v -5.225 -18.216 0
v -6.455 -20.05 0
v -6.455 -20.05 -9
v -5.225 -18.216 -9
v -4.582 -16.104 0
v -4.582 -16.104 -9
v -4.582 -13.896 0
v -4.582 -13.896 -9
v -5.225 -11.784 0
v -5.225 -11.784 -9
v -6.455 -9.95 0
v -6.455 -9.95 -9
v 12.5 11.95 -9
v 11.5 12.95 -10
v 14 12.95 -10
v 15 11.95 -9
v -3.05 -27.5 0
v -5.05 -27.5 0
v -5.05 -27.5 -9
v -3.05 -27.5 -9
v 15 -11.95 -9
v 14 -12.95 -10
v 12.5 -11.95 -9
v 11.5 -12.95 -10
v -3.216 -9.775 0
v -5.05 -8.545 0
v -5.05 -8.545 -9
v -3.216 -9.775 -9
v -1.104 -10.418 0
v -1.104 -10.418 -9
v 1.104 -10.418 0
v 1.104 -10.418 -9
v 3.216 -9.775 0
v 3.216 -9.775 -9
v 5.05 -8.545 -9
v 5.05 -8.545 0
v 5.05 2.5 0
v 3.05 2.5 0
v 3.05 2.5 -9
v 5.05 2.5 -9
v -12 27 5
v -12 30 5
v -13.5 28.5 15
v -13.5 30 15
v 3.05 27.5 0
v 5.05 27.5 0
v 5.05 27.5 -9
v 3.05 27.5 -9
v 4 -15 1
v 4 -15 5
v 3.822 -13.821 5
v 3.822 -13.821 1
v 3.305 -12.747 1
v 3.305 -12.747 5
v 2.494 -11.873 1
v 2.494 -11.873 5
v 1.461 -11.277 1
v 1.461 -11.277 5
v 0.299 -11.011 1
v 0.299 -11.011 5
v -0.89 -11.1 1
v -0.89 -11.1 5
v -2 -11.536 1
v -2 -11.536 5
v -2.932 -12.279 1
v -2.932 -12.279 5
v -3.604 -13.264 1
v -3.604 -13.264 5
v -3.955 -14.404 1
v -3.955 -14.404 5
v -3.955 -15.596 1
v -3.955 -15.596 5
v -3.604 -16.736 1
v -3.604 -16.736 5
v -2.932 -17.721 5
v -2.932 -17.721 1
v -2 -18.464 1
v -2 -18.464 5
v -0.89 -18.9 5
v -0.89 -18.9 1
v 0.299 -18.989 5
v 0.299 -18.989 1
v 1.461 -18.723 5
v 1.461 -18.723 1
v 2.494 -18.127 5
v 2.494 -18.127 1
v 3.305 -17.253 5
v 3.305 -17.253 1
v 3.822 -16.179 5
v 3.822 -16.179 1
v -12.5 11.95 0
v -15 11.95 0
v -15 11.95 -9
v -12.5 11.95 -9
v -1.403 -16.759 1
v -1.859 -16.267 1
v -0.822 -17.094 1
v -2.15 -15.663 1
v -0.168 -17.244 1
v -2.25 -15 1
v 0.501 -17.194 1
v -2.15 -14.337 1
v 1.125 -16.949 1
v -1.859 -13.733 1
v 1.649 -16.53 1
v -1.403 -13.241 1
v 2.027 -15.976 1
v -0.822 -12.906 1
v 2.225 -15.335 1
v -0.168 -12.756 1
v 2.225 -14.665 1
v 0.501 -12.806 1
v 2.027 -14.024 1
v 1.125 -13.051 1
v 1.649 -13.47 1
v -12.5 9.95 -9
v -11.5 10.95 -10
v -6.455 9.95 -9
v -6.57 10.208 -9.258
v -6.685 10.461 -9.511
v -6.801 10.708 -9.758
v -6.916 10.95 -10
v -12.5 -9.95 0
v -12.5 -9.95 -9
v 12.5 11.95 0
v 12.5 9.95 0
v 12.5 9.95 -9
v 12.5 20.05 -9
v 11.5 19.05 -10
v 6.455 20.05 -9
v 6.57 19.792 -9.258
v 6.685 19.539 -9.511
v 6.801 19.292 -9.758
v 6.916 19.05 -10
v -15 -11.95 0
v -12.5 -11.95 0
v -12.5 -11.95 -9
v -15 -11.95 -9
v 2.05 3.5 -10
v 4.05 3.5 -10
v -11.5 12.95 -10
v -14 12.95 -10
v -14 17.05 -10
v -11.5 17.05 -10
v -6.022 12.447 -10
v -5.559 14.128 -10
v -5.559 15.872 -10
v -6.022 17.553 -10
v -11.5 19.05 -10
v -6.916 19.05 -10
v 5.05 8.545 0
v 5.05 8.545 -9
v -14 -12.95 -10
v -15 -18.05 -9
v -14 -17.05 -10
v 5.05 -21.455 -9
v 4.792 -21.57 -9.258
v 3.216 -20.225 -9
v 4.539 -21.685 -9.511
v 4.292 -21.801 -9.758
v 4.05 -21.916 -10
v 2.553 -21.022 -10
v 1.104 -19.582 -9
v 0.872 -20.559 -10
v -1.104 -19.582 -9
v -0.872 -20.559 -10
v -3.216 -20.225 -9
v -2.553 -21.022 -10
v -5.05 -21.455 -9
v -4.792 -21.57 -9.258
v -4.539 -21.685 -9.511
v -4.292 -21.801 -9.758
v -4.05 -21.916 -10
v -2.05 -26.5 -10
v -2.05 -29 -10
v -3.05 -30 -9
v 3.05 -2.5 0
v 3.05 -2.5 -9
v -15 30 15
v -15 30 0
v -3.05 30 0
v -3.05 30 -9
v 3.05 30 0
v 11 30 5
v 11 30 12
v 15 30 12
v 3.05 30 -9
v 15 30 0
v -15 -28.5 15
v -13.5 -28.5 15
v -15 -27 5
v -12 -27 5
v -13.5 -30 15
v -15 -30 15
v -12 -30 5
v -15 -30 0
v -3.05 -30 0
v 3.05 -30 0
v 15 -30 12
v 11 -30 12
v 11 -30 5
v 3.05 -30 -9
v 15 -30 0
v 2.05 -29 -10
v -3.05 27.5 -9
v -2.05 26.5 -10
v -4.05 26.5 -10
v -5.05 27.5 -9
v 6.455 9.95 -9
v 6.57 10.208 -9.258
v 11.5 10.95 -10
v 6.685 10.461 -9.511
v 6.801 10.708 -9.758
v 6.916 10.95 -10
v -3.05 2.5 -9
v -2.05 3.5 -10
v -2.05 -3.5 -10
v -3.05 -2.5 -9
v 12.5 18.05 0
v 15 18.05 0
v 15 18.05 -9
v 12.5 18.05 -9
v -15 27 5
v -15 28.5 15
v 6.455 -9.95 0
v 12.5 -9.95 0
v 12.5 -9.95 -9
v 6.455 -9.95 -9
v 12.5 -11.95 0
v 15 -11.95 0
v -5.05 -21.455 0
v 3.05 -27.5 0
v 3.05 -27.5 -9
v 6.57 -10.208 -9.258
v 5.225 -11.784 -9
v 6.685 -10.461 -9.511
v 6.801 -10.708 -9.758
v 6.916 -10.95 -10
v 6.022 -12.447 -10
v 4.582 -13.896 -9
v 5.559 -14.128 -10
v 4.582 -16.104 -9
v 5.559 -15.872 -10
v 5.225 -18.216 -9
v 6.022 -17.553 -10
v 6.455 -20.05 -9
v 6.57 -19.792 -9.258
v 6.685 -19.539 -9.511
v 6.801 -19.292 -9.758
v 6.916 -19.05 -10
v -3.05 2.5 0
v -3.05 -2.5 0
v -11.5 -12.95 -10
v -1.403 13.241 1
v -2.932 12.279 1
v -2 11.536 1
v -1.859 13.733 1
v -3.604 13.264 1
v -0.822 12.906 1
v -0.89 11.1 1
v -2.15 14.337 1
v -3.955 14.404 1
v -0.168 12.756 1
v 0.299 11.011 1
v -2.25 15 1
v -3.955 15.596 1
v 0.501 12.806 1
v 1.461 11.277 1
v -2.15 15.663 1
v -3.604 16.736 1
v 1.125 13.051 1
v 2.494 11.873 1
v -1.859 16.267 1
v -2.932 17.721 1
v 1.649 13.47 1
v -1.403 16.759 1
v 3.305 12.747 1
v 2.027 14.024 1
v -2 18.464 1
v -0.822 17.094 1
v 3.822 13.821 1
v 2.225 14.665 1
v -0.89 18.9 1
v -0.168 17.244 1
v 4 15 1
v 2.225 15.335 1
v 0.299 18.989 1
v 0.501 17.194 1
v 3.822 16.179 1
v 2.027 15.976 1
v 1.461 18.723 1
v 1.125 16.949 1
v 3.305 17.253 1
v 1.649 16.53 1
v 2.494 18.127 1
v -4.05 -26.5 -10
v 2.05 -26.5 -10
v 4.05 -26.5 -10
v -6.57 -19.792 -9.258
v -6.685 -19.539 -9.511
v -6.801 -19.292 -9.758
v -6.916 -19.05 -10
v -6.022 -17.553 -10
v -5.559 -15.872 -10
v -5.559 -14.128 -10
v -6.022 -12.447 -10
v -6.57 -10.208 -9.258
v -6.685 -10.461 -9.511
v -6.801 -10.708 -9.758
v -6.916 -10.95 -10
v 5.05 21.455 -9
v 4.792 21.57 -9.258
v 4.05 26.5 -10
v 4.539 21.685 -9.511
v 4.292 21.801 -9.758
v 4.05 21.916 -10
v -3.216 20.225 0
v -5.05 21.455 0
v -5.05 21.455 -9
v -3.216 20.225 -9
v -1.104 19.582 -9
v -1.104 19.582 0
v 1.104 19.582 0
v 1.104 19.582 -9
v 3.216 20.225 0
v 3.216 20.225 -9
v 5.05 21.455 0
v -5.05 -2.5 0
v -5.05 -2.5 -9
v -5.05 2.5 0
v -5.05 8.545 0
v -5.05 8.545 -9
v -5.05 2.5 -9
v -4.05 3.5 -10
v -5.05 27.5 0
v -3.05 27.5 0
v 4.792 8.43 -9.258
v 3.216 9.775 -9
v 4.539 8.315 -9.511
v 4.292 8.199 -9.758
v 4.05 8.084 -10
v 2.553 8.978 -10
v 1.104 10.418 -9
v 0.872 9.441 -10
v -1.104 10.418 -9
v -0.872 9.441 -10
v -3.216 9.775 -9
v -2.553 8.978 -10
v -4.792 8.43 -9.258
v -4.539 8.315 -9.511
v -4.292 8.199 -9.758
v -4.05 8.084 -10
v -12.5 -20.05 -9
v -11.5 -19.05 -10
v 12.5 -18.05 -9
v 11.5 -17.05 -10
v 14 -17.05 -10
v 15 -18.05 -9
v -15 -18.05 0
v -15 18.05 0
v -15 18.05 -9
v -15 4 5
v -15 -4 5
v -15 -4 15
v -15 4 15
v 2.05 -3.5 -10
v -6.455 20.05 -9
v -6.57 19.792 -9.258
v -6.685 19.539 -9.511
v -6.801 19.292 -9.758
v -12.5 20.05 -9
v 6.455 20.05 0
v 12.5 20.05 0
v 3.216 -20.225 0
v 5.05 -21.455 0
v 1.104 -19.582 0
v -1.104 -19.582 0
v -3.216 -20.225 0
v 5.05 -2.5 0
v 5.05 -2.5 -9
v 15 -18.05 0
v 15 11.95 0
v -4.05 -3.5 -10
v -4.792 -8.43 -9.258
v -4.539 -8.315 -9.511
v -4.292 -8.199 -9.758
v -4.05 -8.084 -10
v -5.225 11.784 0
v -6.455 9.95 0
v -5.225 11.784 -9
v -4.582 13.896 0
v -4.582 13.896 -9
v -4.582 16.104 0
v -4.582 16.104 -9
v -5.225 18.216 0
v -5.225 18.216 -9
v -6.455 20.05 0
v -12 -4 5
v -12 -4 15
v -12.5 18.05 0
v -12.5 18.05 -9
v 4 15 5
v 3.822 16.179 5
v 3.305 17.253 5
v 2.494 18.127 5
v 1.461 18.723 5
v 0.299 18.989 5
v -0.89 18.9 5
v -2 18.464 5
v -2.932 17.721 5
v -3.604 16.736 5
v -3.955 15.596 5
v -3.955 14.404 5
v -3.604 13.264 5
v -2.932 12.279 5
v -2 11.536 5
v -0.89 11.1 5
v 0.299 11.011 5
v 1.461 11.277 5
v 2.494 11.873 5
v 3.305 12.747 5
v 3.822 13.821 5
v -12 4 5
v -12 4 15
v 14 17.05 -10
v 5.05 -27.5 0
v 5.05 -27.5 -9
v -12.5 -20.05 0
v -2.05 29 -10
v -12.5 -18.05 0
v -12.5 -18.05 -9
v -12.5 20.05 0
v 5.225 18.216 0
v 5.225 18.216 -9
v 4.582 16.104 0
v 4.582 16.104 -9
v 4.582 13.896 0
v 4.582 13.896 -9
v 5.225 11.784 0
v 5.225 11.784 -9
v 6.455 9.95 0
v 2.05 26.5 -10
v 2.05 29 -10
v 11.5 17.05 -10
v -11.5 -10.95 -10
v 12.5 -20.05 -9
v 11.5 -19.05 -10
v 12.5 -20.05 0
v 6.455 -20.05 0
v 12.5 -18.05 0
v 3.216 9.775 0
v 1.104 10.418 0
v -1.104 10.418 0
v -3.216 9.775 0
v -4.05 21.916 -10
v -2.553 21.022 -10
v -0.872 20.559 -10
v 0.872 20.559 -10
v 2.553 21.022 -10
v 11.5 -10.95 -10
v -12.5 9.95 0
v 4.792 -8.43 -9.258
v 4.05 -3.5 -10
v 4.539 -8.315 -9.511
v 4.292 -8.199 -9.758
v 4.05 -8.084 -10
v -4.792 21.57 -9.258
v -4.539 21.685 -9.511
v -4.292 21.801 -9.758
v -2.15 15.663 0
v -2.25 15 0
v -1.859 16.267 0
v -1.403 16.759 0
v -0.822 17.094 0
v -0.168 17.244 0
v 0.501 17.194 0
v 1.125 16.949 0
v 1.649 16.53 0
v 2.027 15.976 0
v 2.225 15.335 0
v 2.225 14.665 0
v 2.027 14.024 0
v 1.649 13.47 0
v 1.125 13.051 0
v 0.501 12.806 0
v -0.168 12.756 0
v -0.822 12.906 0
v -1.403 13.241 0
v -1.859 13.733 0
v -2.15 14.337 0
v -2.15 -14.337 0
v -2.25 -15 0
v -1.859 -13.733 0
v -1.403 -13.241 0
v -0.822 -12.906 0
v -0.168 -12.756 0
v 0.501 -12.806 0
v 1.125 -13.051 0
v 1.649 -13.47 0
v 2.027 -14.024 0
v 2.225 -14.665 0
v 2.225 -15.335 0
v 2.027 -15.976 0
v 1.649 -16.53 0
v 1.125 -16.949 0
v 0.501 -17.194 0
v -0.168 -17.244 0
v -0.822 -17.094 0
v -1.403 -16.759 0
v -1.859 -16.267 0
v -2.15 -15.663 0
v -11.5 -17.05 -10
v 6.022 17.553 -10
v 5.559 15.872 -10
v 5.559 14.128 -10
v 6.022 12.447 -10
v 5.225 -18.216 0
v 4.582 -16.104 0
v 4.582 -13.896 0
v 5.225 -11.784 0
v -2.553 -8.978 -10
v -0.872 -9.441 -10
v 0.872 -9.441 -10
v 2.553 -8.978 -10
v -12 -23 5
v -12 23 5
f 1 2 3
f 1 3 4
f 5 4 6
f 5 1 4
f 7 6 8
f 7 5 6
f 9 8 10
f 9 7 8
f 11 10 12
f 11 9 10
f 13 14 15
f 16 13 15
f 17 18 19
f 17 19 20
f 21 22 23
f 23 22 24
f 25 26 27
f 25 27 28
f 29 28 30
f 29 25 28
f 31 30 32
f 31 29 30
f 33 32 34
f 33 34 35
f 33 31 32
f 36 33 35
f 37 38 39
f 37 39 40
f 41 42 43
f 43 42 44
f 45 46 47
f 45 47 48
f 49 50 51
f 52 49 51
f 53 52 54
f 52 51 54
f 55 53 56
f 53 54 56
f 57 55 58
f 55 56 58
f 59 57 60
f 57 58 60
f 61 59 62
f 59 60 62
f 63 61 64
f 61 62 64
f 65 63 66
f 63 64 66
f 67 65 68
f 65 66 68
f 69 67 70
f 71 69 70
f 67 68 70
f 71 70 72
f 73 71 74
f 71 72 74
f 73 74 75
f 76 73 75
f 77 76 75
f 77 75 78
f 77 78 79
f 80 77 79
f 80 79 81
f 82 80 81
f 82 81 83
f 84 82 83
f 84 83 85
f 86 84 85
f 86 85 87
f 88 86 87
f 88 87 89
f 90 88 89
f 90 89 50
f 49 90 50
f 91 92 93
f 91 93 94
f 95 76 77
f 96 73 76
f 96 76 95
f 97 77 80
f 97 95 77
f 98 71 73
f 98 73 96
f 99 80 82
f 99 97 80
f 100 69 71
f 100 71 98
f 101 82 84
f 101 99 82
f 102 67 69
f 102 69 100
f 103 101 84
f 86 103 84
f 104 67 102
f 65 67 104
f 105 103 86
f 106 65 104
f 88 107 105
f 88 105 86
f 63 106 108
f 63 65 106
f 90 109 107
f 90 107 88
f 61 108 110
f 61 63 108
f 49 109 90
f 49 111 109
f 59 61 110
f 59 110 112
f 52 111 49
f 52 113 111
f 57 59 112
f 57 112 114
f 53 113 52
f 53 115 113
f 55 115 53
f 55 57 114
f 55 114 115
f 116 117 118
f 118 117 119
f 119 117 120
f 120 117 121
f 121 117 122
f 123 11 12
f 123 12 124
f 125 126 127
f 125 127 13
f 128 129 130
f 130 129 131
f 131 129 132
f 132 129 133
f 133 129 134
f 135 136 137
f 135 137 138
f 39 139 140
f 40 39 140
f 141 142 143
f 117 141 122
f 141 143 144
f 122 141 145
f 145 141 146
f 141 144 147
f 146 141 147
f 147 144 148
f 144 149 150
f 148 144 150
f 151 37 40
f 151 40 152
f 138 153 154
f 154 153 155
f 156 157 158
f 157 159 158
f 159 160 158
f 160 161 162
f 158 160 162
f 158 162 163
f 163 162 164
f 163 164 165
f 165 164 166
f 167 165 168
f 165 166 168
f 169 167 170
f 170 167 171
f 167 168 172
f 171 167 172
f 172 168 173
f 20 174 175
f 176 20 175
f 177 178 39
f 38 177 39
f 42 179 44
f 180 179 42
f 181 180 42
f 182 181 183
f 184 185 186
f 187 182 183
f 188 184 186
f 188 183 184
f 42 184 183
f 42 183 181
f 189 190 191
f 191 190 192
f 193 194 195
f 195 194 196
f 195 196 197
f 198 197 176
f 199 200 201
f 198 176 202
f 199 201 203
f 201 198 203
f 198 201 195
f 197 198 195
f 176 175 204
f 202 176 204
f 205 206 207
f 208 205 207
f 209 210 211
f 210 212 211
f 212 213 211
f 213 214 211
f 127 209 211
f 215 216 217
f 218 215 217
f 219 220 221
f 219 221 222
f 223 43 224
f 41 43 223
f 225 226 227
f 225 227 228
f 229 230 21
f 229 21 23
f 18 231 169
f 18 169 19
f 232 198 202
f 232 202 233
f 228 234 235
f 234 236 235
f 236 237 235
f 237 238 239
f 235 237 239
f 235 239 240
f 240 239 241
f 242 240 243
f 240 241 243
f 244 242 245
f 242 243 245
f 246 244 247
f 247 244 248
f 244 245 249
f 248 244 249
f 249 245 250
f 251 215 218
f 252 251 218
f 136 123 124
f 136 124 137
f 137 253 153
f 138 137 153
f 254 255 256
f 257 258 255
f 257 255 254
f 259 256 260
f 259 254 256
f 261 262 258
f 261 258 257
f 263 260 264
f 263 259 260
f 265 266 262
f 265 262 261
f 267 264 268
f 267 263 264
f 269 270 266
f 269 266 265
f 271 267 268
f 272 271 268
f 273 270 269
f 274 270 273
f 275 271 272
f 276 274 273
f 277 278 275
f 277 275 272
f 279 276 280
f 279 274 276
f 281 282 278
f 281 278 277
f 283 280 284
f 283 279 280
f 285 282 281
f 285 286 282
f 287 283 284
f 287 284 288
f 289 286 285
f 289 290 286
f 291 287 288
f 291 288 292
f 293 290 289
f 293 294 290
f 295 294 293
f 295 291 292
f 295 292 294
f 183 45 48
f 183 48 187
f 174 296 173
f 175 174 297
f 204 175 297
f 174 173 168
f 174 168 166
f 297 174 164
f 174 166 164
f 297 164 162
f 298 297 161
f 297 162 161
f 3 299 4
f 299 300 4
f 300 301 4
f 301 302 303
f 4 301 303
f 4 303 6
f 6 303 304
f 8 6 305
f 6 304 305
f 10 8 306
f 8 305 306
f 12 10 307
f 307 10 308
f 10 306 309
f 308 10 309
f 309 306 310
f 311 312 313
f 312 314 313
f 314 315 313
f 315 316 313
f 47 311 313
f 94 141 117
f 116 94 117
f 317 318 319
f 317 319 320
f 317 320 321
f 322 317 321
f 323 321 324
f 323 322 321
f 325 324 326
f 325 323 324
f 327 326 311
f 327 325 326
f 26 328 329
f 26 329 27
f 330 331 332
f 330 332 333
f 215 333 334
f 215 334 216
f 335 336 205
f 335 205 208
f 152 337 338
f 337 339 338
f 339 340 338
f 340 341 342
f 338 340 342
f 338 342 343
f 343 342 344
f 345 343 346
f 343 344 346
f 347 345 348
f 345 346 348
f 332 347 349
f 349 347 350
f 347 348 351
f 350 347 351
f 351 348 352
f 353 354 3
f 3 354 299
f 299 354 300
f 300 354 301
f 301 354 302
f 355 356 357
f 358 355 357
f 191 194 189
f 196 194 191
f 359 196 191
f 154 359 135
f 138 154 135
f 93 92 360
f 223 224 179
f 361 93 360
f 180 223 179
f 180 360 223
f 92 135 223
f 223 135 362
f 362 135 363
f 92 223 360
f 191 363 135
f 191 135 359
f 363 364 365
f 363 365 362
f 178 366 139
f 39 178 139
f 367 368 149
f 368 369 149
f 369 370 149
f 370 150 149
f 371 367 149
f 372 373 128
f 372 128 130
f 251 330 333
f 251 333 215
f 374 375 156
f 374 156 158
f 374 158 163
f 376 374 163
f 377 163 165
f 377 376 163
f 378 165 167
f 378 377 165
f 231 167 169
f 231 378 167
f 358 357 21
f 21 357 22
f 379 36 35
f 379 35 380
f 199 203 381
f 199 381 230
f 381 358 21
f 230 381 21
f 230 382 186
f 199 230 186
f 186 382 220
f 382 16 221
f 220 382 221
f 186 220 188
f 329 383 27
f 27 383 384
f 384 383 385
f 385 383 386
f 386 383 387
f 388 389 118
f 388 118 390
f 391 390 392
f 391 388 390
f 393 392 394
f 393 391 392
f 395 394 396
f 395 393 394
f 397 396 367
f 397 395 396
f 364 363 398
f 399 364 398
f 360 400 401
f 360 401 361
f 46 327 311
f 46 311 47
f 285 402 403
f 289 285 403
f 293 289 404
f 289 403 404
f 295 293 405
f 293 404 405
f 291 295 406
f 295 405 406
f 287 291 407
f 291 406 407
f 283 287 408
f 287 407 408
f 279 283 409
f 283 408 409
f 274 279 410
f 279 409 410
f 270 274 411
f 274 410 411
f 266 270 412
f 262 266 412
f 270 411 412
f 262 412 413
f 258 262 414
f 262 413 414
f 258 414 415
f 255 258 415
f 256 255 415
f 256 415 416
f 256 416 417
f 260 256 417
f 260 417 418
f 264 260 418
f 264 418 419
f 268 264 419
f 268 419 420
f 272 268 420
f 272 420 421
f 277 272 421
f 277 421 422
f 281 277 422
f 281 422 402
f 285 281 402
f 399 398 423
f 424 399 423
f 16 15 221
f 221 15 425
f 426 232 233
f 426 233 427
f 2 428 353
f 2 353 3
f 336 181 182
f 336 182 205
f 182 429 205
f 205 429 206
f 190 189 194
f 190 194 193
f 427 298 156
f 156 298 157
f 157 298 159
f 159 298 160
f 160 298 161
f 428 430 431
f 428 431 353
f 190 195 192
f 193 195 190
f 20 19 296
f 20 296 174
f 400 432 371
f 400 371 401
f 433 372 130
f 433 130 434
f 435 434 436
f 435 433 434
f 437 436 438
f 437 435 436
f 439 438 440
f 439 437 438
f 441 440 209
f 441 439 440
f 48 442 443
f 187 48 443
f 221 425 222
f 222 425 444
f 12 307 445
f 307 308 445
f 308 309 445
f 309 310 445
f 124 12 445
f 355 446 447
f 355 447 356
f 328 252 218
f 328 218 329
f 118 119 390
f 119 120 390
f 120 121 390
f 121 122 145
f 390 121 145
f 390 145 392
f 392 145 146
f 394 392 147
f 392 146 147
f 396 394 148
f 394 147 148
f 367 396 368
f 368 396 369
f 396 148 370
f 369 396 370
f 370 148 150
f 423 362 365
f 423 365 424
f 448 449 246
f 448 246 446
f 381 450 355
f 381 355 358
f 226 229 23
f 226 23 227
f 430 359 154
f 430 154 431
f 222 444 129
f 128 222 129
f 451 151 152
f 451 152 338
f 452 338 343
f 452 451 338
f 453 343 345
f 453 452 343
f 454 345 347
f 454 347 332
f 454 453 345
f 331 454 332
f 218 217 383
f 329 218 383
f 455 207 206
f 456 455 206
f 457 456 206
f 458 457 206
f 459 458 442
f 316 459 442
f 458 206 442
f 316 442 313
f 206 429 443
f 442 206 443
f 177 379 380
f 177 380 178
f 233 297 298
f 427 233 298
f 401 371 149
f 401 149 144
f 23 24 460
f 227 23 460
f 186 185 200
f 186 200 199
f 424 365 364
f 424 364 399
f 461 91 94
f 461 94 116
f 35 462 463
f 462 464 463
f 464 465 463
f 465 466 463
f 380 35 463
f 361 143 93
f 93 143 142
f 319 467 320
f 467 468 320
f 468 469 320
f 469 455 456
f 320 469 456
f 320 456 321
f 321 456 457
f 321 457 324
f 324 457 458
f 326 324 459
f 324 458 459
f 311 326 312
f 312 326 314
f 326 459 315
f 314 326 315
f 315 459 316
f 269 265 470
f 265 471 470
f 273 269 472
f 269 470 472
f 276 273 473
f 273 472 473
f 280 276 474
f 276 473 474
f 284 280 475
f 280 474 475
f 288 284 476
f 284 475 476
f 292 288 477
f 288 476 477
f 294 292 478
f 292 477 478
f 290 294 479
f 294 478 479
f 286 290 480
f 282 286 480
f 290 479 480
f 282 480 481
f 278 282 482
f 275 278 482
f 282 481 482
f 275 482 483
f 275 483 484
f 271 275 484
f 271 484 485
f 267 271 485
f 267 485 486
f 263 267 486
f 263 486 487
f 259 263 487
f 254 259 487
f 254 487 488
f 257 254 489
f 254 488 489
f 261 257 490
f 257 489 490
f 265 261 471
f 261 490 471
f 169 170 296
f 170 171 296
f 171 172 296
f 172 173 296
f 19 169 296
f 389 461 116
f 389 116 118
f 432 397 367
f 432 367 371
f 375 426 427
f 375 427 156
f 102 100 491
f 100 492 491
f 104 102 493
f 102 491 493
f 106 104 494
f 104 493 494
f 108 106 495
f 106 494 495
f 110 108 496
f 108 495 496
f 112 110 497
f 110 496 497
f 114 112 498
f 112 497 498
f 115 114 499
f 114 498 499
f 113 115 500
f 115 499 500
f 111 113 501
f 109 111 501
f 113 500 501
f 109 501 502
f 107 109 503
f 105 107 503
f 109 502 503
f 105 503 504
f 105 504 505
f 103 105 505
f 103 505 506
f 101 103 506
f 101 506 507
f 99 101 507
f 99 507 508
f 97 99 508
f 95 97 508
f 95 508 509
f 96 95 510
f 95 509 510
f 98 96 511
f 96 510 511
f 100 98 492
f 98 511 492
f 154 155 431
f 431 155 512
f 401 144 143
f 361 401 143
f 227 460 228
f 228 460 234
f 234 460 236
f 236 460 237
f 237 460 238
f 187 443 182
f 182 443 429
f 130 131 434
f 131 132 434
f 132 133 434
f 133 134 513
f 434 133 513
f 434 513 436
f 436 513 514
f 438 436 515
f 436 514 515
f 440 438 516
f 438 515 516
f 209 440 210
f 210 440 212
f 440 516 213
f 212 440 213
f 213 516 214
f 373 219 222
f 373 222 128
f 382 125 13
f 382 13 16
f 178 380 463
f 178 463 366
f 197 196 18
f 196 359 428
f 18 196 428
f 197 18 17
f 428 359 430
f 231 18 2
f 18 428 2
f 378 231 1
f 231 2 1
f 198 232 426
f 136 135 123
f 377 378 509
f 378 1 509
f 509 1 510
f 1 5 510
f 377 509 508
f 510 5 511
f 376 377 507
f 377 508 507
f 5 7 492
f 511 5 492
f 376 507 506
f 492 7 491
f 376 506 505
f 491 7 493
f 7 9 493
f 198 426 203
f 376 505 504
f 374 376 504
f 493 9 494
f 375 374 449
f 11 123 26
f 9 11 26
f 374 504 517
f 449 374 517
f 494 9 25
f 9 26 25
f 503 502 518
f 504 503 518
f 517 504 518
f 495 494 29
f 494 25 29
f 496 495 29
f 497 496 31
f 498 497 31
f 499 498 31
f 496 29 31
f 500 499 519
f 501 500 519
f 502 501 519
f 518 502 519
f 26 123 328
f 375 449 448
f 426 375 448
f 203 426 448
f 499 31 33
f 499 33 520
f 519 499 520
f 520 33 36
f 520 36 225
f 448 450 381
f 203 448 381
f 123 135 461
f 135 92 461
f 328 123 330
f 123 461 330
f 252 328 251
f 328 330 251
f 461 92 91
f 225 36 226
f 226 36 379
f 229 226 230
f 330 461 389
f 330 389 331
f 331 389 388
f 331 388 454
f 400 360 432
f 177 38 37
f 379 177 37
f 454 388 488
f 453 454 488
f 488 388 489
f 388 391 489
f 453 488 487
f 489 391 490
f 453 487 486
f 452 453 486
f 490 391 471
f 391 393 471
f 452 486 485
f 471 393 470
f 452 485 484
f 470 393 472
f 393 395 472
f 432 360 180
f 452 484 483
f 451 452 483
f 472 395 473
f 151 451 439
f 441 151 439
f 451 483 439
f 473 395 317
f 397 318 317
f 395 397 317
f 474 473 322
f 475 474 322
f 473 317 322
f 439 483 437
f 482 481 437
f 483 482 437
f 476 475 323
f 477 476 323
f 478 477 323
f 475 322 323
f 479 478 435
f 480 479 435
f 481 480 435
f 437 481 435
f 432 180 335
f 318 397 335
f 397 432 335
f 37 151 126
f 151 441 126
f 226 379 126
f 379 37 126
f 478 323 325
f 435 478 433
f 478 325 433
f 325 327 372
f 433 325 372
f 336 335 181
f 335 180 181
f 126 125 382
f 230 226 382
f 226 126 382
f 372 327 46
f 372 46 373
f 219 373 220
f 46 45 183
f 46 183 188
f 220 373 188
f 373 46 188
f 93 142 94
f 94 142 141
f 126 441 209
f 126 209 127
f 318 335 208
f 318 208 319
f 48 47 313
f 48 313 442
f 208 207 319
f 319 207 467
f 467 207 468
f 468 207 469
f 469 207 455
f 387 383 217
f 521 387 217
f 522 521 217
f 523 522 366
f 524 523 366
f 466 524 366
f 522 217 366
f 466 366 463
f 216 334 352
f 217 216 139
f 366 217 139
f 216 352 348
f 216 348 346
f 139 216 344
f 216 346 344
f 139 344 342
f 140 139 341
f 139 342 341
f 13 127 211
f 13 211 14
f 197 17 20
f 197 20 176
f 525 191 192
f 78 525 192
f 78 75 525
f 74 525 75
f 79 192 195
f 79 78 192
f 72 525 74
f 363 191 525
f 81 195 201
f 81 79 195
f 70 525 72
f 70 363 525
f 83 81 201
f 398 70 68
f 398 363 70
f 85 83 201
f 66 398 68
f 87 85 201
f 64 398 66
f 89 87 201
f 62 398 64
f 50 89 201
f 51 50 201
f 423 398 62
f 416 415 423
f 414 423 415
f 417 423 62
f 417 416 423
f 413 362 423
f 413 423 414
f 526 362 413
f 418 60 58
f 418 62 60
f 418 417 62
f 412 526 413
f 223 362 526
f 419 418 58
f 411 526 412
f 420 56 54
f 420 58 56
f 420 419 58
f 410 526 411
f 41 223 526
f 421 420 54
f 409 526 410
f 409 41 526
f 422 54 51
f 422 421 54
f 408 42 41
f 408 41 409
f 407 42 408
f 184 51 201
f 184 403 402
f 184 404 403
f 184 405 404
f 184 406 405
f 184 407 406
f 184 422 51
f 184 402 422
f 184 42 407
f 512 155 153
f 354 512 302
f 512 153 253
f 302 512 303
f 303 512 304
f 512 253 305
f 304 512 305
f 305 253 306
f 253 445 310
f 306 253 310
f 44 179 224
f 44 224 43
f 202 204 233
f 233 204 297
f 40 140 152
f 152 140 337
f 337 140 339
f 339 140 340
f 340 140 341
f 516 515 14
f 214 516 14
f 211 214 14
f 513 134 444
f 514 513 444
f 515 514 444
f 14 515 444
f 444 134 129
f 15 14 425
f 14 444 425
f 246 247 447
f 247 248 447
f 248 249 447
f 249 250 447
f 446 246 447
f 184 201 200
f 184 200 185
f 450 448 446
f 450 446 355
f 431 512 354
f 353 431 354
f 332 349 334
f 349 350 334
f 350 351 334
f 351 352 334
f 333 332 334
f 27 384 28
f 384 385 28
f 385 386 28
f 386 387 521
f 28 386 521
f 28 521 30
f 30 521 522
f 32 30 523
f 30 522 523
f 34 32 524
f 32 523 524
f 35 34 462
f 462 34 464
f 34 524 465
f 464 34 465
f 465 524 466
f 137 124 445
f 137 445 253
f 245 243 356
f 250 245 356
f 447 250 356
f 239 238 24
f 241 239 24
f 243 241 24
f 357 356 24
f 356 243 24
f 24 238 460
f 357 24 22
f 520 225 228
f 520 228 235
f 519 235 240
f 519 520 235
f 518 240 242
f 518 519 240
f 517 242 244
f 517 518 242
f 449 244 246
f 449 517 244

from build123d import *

# Parameters (mm, degrees)
SKETCH_1_W                   = 30
SKETCH_1_H                   = 60
EXTRUDE_1_DEPTH              = 5
SKETCH_2_W                   = 3
SKETCH_2_H                   = 3
SKETCH_2_W_2                 = 4
SKETCH_2_H_2                 = 60
SKETCH_2_H_3                 = 8
EXTRUDE_2_DEPTH              = 10
CUT_EXTRUDE_1_DEPTH          = 44.058100283
CUT_EXTRUDE_3_DEPTH          = 7
SKETCH_5_W                   = 4
SKETCH_5_H                   = 3
CUT_EXTRUDE_4_DEPTH          = 64.639610307
HOLE_WIZARD_M4_1_D           = 4.5
HOLE_WIZARD_M4_1_CBORE_D     = 8
HOLE_WIZARD_M4_1_CBORE_DEPTH = 4
EXTRUDE_3_DEPTH              = 10
CHAMFER_1_SIZE               = 1


with BuildPart() as part:
    # 스케치1 → 보스-돌출1 (new body)
    with BuildSketch(Plane.XY):
        Rectangle(SKETCH_1_W, SKETCH_1_H)
    extrude(amount=EXTRUDE_1_DEPTH)

    # 스케치2 → 보스-돌출2 (add)
    with BuildSketch(Plane.XY.offset(5)):
        with Locations((-13.5, -28.5)):
            Rectangle(SKETCH_2_W, SKETCH_2_H)
        with Locations((-13.5, 28.5)):
            Rectangle(SKETCH_2_W, SKETCH_2_H)
        with Locations((13, 0)):
            Rectangle(SKETCH_2_W_2, SKETCH_2_H_2)
        with Locations((-13.5, 0)):
            Rectangle(SKETCH_2_W, SKETCH_2_H_3)
    extrude(amount=EXTRUDE_2_DEPTH)

    # 스케치3 → 컷-돌출1 (cut, through all)
    with BuildSketch(Plane(origin=(-12, 0, 0), x_dir=(0, 0, -1), z_dir=(1, 0, 0))):
        Polygon((-15, -28.5), (-5, -27), (-15, -27), align=None)
    cut_extrude_1 = extrude(amount=-CUT_EXTRUDE_1_DEPTH, mode=Mode.SUBTRACT)

    # 스케치4 → 컷-돌출3 (cut)
    with BuildSketch(Plane.XZ.offset(30)):
        Polygon((-13.5, 15), (-12, 15), (-12, 5), align=None)
    cut_extrude_3 = extrude(amount=-CUT_EXTRUDE_3_DEPTH, mode=Mode.SUBTRACT)

    # 대칭 복사1: 컷-돌출1, 컷-돌출3 across plane
    add(cut_extrude_1.mirror(Plane(origin=(0, 0, 0), x_dir=(0, 0, 1), z_dir=(0, -1, 0))), mode=Mode.SUBTRACT)
    add(cut_extrude_3.mirror(Plane(origin=(0, 0, 0), x_dir=(0, 0, 1), z_dir=(0, -1, 0))), mode=Mode.SUBTRACT)

    # 스케치5 → 컷-돌출4 (cut, through all)
    with BuildSketch(Plane(origin=(0, 30, 0), x_dir=(1, 0, 0), z_dir=(0, 1, 0))):
        with Locations((13, -13.5)):
            Rectangle(SKETCH_5_W, SKETCH_5_H)
    extrude(amount=-CUT_EXTRUDE_4_DEPTH, mode=Mode.SUBTRACT)

    # M4 소켓 머리 캡 나사용 카운터보어1 (through all)
    with Locations(Plane.XY.offset(5)):
        with Locations((0, -15), (0, 15)):
            CounterBoreHole(HOLE_WIZARD_M4_1_D / 2, HOLE_WIZARD_M4_1_CBORE_D / 2, HOLE_WIZARD_M4_1_CBORE_DEPTH)

    # 스케치9 → 보스-돌출3 (add)
    with BuildSketch(Plane(origin=(0, 0, 0), x_dir=(-1, 0, 0), z_dir=(0, 0, -1))):
        with BuildLine():
            Line((-3.05, 30), (3.05, 30))
            Line((3.05, 30), (3.05, 27.5))
            Line((3.05, 27.5), (5.05, 27.5))
            Line((5.05, 27.5), (5.05, 21.454957169))
            ThreePointArc((5.05, 21.454957169), (0, 19.5), (-5.05, 21.454957169))
            Line((-5.05, 21.454957169), (-5.05, 27.5))
            Line((-5.05, 27.5), (-3.05, 27.5))
            Line((-3.05, 27.5), (-3.05, 30))
        make_face()
        with BuildLine():
            Line((15, 18.05), (15, 11.95))
            Line((15, 11.95), (12.5, 11.95))
            Line((12.5, 11.95), (12.5, 9.95))
            Line((12.5, 9.95), (6.454957169, 9.95))
            ThreePointArc((6.454957169, 9.95), (4.5, 15), (6.454957169, 20.05))
            Line((6.454957169, 20.05), (12.5, 20.05))
            Line((12.5, 20.05), (12.5, 18.05))
            Line((12.5, 18.05), (15, 18.05))
        make_face()
        with BuildLine():
            Line((-3.05, 2.5), (-5.05, 2.5))
            Line((-5.05, 2.5), (-5.05, 8.545042831))
            ThreePointArc((-5.05, 8.545042831), (0, 10.5), (5.05, 8.545042831))
            Line((5.05, 8.545042831), (5.05, 2.5))
            Line((5.05, 2.5), (3.05, 2.5))
            Line((3.05, 2.5), (3.05, -2.5))
            Line((3.05, -2.5), (5.05, -2.5))
            Line((5.05, -2.5), (5.05, -8.545042831))
            ThreePointArc((5.05, -8.545042831), (0, -10.5), (-5.05, -8.545042831))
            Line((-5.05, -8.545042831), (-5.05, -2.5))
            Line((-5.05, -2.5), (-3.05, -2.5))
            Line((-3.05, -2.5), (-3.05, 2.5))
        make_face()
        with BuildLine():
            Line((-15, 11.95), (-15, 18.05))
            Line((-15, 18.05), (-12.5, 18.05))
            Line((-12.5, 18.05), (-12.5, 20.05))
            Line((-12.5, 20.05), (-6.454957169, 20.05))
            ThreePointArc((-6.454957169, 20.05), (-4.5, 15), (-6.454957169, 9.95))
            Line((-6.454957169, 9.95), (-12.5, 9.95))
            Line((-12.5, 9.95), (-12.5, 11.95))
            Line((-12.5, 11.95), (-15, 11.95))
        make_face()
        with BuildLine():
            Line((-5.05, -27.5), (-5.05, -21.454957169))
            ThreePointArc((-5.05, -21.454957169), (0, -19.5), (5.05, -21.454957169))
            Line((5.05, -21.454957169), (5.05, -27.5))
            Line((5.05, -27.5), (3.05, -27.5))
            Line((3.05, -27.5), (3.05, -30))
            Line((3.05, -30), (-3.05, -30))
            Line((-3.05, -30), (-3.05, -27.5))
            Line((-3.05, -27.5), (-5.05, -27.5))
        make_face()
        with BuildLine():
            Line((-12.5, -9.95), (-6.454957169, -9.95))
            ThreePointArc((-6.454957169, -9.95), (-4.5, -15), (-6.454957169, -20.05))
            Line((-6.454957169, -20.05), (-12.5, -20.05))
            Line((-12.5, -20.05), (-12.5, -18.05))
            Line((-12.5, -18.05), (-15, -18.05))
            Line((-15, -18.05), (-15, -11.95))
            Line((-15, -11.95), (-12.5, -11.95))
            Line((-12.5, -11.95), (-12.5, -9.95))
        make_face()
        with BuildLine():
            Line((12.5, -20.05), (6.454957169, -20.05))
            ThreePointArc((6.454957169, -20.05), (4.5, -15), (6.454957169, -9.95))
            Line((6.454957169, -9.95), (12.5, -9.95))
            Line((12.5, -9.95), (12.5, -11.95))
            Line((12.5, -11.95), (15, -11.95))
            Line((15, -11.95), (15, -18.05))
            Line((15, -18.05), (12.5, -18.05))
            Line((12.5, -18.05), (12.5, -20.05))
        make_face()
    extrude(amount=EXTRUDE_3_DEPTH)

    # 모따기1
    chamfer_1_edges = [part.edges().sort_by_distance(p)[0] for p in [
        (3.05, 28.75, -10),
        (4.05, 27.5, -10),
        (5.05, 24.477478584, -10),
        (0, 19.5, -10),
        (-5.05, 24.477478584, -10),
        (-4.05, 27.5, -10),
        (-3.05, 28.75, -10),
        (0, 30, -10),
        (-13.75, 18.05, -10),
        (-12.5, 19.05, -10),
        (-9.477478584, 20.05, -10),
        (-4.5, 15, -10),
        (-9.477478584, 9.95, -10),
        (-12.5, 10.95, -10),
        (-13.75, 11.95, -10),
        (-15, 15, -10),
        (3.05, 0, -10),
        (4.05, -2.5, -10),
        (5.05, -5.522521416, -10),
        (0, -10.5, -10),
        (-5.05, -5.522521416, -10),
        (-4.05, -2.5, -10),
        (-3.05, 0, -10),
        (-4.05, 2.5, -10),
        (-5.05, 5.522521416, -10),
        (0, 10.5, -10),
        (5.05, 5.522521416, -10),
        (4.05, 2.5, -10),
        (13.75, 11.95, -10),
        (12.5, 10.95, -10),
        (9.477478584, 9.95, -10),
        (4.5, 15, -10),
        (9.477478584, 20.05, -10),
        (12.5, 19.05, -10),
        (13.75, 18.05, -10),
        (15, 15, -10),
        (0, -19.5, -10),
        (5.05, -24.477478584, -10),
        (4.05, -27.5, -10),
        (3.05, -28.75, -10),
        (0, -30, -10),
        (-3.05, -28.75, -10),
        (-4.05, -27.5, -10),
        (-5.05, -24.477478584, -10),
        (4.5, -15, -10),
        (9.477478584, -9.95, -10),
        (12.5, -10.95, -10),
        (13.75, -11.95, -10),
        (15, -15, -10),
        (13.75, -18.05, -10),
        (12.5, -19.05, -10),
        (9.477478584, -20.05, -10),
        (-4.5, -15, -10),
        (-9.477478584, -20.05, -10),
        (-12.5, -19.05, -10),
        (-13.75, -18.05, -10),
        (-15, -15, -10),
        (-13.75, -11.95, -10),
        (-12.5, -10.95, -10),
        (-9.477478584, -9.95, -10),
    ]]
    chamfer(chamfer_1_edges, length=CHAMFER_1_SIZE)


solid = part.part
